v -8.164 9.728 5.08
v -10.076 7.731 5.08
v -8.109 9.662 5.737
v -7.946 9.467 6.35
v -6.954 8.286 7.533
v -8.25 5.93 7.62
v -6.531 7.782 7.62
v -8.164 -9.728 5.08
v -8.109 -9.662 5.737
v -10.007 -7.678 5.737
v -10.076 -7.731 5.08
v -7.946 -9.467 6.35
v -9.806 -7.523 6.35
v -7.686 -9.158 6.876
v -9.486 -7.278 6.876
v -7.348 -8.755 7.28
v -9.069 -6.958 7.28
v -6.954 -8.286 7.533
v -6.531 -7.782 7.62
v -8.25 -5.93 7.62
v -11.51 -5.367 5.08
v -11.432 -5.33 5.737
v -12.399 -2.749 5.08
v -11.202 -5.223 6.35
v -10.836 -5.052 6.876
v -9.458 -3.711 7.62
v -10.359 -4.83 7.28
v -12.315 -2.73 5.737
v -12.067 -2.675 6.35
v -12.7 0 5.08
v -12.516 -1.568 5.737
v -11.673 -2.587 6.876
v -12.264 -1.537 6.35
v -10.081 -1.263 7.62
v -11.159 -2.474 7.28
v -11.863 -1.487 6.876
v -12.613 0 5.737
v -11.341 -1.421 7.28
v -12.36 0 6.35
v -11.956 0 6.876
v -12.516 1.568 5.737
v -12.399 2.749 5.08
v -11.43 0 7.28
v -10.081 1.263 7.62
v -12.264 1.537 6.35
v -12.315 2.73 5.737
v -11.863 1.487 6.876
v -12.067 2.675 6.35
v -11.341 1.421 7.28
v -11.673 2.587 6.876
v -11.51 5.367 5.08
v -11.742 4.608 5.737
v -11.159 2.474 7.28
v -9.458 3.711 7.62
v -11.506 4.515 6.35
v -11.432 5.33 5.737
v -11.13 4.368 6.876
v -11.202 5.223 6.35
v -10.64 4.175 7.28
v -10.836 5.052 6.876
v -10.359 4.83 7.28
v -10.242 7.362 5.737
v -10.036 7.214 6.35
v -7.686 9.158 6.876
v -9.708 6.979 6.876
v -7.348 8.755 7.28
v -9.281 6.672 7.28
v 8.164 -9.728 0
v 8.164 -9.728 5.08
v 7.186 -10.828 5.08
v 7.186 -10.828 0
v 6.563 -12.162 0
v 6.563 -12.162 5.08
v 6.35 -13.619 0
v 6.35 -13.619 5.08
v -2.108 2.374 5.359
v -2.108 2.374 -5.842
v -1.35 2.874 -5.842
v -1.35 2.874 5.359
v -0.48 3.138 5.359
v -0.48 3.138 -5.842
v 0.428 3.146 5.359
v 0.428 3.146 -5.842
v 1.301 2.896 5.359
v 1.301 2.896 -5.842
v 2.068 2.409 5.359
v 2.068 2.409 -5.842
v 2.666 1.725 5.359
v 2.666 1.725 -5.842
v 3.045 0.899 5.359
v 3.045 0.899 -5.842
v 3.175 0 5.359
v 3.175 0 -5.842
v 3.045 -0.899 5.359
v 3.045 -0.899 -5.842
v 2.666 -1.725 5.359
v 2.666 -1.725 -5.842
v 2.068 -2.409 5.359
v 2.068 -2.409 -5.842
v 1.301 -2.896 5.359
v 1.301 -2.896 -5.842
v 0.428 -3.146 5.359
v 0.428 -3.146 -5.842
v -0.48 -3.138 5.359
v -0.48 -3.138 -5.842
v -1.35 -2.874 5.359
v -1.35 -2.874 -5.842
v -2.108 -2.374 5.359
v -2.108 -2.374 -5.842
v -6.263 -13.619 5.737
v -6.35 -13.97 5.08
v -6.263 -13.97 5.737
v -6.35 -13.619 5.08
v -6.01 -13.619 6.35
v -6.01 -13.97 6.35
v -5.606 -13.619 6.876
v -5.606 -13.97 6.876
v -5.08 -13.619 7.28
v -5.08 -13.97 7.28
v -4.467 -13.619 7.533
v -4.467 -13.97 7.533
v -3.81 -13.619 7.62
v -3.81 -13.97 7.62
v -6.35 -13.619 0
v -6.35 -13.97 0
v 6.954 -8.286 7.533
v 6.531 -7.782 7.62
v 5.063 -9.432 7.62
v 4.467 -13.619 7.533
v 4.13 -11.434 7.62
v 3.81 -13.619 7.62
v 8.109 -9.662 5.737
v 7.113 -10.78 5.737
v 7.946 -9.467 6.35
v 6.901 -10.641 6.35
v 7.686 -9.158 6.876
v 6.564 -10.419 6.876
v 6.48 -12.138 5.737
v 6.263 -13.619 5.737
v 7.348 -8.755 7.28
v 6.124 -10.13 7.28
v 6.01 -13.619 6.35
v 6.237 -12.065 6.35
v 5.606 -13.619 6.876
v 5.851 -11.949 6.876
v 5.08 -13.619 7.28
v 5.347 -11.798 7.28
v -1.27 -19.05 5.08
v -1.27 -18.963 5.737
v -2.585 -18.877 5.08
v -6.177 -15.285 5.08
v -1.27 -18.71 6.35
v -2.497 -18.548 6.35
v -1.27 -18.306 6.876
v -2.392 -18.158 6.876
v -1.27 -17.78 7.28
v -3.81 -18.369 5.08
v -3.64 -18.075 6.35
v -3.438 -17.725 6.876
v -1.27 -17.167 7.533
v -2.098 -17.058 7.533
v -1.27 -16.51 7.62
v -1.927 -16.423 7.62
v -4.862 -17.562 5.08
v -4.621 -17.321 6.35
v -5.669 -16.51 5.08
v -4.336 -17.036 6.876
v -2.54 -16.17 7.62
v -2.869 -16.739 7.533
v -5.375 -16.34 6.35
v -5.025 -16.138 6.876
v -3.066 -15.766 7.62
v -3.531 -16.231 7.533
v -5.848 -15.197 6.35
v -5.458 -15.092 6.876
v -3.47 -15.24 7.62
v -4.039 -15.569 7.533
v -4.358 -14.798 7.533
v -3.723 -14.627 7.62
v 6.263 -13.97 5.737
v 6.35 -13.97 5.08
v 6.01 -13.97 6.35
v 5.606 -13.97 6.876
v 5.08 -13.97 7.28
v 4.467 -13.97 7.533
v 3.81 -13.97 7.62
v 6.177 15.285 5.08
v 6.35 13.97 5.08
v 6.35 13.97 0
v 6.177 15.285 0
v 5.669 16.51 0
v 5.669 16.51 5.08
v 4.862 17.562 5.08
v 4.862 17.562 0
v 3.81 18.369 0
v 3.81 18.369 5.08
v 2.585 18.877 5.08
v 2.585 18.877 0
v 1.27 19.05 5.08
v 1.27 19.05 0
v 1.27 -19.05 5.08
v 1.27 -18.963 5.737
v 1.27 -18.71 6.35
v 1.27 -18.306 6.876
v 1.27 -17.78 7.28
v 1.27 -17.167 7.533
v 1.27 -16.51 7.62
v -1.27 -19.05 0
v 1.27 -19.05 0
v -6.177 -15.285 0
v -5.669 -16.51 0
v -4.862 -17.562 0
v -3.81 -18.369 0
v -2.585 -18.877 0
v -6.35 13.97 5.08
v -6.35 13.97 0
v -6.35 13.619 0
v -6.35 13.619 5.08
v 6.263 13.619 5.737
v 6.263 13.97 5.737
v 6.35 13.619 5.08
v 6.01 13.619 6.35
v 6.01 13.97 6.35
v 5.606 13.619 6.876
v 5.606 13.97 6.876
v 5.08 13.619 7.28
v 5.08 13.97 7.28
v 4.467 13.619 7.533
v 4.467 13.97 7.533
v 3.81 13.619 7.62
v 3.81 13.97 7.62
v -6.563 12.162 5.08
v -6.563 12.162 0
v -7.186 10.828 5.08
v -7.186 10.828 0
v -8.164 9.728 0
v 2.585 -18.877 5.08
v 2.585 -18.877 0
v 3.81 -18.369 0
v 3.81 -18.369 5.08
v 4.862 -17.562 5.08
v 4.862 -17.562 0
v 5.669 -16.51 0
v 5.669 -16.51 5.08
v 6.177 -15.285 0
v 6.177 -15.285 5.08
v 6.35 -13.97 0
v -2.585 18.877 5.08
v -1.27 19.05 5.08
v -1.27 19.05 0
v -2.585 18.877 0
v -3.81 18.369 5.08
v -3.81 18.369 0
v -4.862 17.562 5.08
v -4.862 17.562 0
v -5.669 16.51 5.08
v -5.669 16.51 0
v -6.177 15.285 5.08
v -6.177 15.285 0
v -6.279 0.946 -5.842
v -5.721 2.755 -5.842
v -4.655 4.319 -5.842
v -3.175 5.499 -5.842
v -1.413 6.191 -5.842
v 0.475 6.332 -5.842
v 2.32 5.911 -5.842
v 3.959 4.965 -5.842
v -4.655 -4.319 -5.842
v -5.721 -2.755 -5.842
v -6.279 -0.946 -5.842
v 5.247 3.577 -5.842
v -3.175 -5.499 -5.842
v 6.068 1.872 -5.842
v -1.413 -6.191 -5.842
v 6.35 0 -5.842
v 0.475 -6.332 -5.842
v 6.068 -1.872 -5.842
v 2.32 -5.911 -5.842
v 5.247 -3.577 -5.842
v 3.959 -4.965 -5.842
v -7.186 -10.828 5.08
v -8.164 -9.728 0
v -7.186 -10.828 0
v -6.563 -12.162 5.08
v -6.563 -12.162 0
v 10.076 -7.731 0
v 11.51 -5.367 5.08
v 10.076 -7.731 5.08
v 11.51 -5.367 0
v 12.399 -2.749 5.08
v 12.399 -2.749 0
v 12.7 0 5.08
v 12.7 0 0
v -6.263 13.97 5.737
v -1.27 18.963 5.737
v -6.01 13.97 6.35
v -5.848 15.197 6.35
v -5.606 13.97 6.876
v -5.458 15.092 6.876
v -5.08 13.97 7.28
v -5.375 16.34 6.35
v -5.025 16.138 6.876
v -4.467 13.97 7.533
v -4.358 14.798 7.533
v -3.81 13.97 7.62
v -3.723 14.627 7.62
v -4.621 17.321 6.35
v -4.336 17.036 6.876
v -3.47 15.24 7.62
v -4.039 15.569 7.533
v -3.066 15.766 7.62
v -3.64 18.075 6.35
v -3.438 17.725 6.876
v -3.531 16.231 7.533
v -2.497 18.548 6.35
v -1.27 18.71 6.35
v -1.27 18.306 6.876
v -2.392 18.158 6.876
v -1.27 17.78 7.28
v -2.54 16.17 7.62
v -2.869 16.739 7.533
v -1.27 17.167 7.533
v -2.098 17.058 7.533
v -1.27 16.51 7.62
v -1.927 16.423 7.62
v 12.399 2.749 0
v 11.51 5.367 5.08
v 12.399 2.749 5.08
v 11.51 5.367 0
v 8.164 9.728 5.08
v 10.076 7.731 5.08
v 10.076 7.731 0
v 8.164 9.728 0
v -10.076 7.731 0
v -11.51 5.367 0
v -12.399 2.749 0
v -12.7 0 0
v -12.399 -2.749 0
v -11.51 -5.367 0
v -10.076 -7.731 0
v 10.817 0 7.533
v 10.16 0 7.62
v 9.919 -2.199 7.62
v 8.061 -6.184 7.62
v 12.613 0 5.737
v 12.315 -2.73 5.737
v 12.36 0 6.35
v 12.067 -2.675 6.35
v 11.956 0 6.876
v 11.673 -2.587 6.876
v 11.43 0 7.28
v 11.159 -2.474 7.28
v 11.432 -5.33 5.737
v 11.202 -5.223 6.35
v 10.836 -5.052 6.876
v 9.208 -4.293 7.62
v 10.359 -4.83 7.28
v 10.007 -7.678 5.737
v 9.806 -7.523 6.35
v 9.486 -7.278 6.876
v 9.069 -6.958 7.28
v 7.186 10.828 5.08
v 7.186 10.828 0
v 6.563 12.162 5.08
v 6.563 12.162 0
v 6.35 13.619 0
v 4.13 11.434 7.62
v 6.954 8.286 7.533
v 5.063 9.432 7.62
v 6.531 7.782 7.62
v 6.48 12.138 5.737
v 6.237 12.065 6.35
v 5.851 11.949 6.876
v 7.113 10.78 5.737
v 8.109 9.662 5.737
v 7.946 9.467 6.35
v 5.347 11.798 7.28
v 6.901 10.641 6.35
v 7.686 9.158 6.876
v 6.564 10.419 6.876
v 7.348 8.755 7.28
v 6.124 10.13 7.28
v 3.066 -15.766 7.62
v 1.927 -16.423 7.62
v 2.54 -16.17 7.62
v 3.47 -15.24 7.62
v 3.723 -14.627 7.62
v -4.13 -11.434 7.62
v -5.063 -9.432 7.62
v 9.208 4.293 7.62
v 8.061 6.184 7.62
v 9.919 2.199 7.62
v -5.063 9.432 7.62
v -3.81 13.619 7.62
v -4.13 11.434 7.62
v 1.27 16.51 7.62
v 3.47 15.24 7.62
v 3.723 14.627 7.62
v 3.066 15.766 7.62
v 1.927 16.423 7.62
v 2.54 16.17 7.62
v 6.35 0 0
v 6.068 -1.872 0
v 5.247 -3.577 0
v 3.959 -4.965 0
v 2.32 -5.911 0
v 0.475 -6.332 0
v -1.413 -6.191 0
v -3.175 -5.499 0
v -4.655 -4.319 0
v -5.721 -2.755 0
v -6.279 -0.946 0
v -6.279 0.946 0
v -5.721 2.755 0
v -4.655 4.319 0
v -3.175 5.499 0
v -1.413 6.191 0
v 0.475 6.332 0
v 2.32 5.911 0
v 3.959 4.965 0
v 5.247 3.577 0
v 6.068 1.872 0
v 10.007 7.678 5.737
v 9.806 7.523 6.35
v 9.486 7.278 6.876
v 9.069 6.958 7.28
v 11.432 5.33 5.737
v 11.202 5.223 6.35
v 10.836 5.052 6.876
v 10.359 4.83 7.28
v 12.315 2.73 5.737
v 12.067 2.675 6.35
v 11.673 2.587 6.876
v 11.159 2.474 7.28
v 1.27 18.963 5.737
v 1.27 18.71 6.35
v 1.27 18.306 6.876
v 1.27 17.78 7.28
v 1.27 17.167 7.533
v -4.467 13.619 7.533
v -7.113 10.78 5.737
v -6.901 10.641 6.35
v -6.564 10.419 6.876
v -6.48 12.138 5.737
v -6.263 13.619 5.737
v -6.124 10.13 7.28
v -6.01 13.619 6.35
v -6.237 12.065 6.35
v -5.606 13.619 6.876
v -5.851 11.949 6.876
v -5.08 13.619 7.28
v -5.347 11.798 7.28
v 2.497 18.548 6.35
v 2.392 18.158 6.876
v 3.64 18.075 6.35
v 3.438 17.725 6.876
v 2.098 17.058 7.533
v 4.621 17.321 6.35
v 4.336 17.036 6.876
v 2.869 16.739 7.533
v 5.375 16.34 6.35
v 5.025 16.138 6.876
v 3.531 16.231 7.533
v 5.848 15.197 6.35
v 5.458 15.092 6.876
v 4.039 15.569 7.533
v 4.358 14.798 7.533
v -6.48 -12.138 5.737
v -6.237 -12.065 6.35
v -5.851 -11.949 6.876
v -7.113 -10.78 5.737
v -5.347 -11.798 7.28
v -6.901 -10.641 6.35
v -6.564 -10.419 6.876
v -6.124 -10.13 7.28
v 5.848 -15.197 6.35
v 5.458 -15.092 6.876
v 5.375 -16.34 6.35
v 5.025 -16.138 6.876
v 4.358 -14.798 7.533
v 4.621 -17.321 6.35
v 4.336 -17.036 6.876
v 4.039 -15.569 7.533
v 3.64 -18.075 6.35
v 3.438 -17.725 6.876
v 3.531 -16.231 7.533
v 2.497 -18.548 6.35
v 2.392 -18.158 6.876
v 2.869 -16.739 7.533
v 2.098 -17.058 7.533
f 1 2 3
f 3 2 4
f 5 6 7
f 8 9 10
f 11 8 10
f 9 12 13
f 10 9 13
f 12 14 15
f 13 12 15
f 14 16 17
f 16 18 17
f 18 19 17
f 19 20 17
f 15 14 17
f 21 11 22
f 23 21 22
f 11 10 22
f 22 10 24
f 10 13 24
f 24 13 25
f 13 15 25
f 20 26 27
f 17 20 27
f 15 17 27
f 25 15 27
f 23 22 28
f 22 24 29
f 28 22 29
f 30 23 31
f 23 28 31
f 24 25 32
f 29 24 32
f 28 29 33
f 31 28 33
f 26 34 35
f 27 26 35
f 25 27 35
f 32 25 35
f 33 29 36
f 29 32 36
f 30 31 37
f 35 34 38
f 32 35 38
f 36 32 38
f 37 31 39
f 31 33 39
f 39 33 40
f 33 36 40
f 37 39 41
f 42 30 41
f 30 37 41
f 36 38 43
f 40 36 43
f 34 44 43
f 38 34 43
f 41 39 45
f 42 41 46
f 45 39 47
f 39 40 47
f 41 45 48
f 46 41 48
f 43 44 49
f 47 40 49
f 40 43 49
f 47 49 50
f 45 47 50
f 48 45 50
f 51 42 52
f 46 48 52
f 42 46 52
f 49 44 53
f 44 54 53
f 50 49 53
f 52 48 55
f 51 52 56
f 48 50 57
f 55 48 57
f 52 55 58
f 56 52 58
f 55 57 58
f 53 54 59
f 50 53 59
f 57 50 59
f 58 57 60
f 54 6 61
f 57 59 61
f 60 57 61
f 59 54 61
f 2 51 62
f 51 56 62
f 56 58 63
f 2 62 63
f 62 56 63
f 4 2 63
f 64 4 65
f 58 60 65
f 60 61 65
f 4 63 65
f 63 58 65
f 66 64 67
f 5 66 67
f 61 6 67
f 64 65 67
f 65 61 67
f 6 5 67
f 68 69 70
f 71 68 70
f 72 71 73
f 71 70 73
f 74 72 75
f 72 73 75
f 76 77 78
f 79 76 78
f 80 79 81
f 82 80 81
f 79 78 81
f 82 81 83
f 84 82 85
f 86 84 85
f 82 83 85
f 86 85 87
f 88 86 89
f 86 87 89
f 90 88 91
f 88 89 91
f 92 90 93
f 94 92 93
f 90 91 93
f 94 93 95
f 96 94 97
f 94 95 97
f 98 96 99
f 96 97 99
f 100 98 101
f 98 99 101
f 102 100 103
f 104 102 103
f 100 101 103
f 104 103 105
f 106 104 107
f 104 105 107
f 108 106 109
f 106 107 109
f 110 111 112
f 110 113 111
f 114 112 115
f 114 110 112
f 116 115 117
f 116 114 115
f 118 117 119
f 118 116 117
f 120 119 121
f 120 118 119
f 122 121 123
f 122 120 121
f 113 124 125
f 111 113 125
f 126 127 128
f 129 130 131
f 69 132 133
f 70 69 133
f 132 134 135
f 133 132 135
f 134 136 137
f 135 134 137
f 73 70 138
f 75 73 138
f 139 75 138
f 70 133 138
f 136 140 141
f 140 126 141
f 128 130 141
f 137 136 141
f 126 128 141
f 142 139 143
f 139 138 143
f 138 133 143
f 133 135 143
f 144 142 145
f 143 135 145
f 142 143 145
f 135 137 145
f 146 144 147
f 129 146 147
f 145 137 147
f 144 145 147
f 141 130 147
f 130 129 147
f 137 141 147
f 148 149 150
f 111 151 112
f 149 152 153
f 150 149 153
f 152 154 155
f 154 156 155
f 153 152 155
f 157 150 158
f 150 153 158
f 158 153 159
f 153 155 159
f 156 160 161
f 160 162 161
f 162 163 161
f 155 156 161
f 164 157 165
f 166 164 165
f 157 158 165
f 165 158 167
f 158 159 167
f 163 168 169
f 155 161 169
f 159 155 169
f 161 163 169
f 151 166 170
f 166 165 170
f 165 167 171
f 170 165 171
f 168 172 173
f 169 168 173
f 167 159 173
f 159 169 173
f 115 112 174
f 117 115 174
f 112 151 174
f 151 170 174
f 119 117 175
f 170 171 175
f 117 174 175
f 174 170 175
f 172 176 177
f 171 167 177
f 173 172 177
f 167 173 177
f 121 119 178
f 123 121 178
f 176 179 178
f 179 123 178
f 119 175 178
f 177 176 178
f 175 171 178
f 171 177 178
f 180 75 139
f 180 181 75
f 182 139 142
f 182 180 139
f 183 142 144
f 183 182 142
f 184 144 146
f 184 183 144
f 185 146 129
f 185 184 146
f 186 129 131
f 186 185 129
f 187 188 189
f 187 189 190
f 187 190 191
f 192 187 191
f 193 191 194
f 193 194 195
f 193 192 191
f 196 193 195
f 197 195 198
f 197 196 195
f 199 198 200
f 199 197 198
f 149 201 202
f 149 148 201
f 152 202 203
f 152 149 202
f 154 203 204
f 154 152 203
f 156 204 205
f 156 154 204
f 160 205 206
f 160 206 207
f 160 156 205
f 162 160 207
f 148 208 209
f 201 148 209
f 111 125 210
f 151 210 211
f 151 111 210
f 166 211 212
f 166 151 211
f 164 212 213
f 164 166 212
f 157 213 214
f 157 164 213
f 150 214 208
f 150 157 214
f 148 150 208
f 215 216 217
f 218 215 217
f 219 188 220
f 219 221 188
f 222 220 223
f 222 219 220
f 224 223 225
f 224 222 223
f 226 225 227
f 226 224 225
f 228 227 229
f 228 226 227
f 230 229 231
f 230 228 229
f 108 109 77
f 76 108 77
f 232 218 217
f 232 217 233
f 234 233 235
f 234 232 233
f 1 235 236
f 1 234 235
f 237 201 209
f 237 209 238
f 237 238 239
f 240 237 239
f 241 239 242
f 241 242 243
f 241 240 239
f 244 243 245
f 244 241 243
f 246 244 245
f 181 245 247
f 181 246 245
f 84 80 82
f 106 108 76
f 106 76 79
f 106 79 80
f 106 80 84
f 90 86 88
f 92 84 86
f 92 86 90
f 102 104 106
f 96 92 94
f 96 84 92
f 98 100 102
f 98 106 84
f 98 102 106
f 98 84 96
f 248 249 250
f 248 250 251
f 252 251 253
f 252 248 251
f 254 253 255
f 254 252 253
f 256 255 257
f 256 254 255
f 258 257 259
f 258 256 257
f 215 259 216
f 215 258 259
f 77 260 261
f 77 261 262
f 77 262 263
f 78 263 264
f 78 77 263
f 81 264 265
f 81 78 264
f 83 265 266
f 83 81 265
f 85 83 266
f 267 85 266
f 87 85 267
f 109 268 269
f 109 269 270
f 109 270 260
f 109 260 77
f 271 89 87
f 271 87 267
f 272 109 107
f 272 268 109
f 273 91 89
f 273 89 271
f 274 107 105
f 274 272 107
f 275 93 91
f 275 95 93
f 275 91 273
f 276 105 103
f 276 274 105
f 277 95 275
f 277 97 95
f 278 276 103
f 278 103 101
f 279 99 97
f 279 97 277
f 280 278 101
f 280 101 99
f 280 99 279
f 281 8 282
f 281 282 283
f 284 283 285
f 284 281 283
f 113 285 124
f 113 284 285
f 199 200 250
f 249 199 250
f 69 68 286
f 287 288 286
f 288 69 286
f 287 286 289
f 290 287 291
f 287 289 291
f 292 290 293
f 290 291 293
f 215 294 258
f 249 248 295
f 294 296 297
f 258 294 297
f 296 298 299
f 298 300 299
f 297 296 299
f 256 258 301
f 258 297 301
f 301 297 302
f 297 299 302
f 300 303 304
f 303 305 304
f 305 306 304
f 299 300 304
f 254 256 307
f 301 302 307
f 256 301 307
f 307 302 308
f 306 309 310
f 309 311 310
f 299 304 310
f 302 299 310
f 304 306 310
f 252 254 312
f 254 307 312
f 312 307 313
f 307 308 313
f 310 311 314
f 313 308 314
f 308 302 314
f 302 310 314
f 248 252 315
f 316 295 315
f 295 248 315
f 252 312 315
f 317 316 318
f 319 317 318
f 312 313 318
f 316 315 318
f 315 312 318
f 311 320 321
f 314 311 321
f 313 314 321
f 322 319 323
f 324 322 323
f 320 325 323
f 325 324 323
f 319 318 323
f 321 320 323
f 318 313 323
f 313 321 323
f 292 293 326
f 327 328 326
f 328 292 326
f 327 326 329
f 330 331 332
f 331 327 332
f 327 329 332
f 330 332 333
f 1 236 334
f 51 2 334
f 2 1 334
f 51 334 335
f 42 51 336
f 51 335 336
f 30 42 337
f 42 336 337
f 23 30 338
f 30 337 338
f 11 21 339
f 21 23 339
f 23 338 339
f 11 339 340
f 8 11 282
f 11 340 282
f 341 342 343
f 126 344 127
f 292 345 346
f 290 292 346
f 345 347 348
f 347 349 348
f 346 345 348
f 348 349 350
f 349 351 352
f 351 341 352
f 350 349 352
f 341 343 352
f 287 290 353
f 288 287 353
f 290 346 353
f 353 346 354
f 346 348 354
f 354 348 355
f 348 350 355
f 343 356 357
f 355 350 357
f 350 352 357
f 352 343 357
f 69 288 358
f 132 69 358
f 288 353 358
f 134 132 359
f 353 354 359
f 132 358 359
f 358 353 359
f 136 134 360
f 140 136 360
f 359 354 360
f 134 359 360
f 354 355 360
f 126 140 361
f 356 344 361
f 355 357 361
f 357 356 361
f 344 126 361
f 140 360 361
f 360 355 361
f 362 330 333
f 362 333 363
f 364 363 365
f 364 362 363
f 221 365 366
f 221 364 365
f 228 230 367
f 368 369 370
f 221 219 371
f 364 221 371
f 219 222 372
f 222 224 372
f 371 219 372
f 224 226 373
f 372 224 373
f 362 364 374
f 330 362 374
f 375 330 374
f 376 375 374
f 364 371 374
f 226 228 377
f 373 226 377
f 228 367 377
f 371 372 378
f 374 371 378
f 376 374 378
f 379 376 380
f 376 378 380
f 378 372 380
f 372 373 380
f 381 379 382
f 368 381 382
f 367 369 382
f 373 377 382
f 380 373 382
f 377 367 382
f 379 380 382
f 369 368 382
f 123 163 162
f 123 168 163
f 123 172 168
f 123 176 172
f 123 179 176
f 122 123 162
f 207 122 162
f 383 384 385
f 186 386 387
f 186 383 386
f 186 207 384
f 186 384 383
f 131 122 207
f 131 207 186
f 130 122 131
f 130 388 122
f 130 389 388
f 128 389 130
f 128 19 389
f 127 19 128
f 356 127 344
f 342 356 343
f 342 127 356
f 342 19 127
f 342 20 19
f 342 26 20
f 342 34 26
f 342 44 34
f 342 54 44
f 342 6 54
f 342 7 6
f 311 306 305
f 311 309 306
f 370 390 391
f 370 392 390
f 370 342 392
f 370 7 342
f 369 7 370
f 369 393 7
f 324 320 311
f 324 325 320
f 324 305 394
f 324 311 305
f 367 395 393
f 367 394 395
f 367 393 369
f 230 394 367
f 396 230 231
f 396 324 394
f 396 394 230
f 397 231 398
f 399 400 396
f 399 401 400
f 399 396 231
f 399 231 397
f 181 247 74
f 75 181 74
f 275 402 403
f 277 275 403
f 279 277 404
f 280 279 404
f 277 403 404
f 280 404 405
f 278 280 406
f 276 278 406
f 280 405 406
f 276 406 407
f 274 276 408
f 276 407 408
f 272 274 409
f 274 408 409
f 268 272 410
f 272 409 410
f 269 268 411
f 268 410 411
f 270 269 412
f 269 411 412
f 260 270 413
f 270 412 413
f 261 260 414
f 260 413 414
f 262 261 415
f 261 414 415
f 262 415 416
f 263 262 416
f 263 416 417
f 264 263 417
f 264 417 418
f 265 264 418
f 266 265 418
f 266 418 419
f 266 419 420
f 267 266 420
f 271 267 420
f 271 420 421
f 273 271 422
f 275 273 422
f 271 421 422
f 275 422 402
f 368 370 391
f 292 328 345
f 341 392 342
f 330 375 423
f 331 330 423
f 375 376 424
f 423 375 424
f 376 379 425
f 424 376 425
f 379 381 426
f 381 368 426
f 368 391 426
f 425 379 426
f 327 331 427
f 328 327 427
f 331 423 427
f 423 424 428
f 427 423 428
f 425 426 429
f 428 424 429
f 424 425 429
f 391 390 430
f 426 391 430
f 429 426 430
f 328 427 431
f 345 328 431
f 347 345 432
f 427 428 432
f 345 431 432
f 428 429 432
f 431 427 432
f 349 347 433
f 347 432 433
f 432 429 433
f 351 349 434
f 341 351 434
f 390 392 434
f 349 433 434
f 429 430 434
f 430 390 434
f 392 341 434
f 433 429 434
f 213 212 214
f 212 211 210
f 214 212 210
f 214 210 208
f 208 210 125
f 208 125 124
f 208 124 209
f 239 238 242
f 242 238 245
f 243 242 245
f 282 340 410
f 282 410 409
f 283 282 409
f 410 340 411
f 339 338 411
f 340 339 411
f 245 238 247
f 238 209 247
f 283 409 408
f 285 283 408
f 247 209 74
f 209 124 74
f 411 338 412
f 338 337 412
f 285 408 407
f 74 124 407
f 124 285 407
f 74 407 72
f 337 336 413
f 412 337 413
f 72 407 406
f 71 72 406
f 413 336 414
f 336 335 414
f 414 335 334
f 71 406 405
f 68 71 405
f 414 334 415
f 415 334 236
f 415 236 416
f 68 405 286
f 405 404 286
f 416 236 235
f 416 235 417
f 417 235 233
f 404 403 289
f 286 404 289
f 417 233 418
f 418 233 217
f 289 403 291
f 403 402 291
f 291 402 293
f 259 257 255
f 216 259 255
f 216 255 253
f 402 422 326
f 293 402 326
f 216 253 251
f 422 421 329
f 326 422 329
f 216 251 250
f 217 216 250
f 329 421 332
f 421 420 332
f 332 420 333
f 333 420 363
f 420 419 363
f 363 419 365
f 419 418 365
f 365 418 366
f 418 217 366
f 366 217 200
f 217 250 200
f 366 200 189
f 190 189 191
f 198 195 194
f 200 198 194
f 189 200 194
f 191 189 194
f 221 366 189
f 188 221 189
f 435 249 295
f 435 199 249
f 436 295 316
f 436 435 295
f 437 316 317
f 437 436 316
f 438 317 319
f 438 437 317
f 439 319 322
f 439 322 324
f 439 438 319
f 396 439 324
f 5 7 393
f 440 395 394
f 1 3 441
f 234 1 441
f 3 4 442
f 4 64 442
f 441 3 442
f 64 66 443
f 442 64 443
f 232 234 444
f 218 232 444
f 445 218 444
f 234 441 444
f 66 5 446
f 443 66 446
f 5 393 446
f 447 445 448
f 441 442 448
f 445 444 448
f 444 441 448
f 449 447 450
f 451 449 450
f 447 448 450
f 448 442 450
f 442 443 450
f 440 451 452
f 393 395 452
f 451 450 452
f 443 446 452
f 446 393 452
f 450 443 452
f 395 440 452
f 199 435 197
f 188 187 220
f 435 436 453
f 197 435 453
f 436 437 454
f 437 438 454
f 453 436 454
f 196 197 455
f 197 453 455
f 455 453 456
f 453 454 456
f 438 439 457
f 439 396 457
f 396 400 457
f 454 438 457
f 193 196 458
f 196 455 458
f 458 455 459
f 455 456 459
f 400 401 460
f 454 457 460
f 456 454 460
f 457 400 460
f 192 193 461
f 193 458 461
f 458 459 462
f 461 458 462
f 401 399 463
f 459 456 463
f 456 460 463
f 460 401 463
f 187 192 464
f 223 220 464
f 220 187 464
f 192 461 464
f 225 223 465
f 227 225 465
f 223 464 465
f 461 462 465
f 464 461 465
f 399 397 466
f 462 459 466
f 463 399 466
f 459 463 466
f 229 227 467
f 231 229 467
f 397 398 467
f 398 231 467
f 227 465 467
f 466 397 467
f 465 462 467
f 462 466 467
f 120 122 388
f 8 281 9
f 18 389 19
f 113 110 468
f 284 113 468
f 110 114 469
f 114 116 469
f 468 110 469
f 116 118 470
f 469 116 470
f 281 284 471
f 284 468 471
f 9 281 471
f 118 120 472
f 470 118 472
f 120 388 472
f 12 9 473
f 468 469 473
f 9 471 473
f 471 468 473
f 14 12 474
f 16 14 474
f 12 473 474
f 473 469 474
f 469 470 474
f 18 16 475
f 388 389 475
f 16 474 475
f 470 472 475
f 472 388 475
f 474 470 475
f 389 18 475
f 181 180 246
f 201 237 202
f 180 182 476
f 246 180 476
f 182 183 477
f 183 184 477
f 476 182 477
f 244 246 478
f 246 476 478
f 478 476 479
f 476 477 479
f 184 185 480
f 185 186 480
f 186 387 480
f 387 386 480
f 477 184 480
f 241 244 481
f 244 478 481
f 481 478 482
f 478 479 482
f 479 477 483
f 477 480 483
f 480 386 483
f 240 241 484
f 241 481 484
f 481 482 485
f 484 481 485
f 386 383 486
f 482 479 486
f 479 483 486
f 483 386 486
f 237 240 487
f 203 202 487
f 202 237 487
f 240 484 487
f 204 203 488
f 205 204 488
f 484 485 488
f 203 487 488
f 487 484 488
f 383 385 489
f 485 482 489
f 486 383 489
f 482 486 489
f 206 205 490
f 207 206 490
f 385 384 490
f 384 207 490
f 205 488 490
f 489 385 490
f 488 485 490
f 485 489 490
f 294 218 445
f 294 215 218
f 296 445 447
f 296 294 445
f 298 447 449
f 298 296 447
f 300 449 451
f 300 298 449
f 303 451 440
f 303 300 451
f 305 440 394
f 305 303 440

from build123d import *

# Parameters (mm, degrees)
F1_DEPTH = 7.62
F2_R     = 5.08
F3_R     = 2.54
F4_R     = 6.35
F5_DEPTH = 5.842
F7_DEPTH = 11.2014


with BuildPart() as f1:
    # F0 (on Top) → F1 (new body)
    with BuildSketch(Plane.XY):
        with BuildLine():
            ThreePointArc((6.35, -10.9985226281), (10.9985226281, -6.35), (12.7, 0))
            ThreePointArc((12.7, 0), (10.9985226281, 6.35), (6.35, 10.9985226281))
            Line((6.35, 10.9985226281), (6.35, -10.9985226281))
        make_face()
        with BuildLine():
            Line((6.35, -10.9985226281), (6.35, 10.9985226281))
            ThreePointArc((6.35, 10.9985226281), (0, 12.7), (-6.35, 10.9985226281))
            Line((-6.35, 10.9985226281), (-6.35, -10.9985226281))
            ThreePointArc((-6.35, -10.9985226281), (0, -12.7), (6.35, -10.9985226281))
        make_face()
        with BuildLine():
            ThreePointArc((-6.35, 10.9985226281), (0, 12.7), (6.35, 10.9985226281))
            Line((6.35, 10.9985226281), (6.35, 19.05))
            Line((6.35, 19.05), (-6.35, 19.05))
            Line((-6.35, 19.05), (-6.35, 10.9985226281))
        make_face()
        with BuildLine():
            Line((6.35, -19.05), (6.35, -10.9985226281))
            ThreePointArc((6.35, -10.9985226281), (0, -12.7), (-6.35, -10.9985226281))
            Line((-6.35, -10.9985226281), (-6.35, -19.05))
            Line((-6.35, -19.05), (6.35, -19.05))
        make_face()
        with BuildLine():
            Line((-6.35, -10.9985226281), (-6.35, 10.9985226281))
            ThreePointArc((-6.35, 10.9985226281), (-12.7, 0), (-6.35, -10.9985226281))
        make_face()
    extrude(amount=F1_DEPTH)

    # F2
    f2_edges = [f1.edges().sort_by_distance(p)[0] for p in [
        (6.35, -10.998523, 3.81),
        (6.35, -19.05, 3.81),
        (-6.35, -19.05, 3.81),
        (-6.35, -10.998523, 3.81),
        (-6.35, 10.998523, 3.81),
        (-6.35, 19.05, 3.81),
        (6.35, 19.05, 3.81),
        (6.35, 10.998523, 3.81),
    ]]
    fillet(f2_edges, radius=F2_R)

    # F3
    f3_edges = [f1.edges().sort_by_distance(p)[0] for p in [
        (12.7, 0, 7.62),
        (6.825859, -11.472541, 7.62),
        (6.825859, 11.472541, 7.62),
        (6.35, -13.794616, 7.62),
        (6.35, 13.794616, 7.62),
        (4.862102, -17.562102, 7.62),
        (4.862102, 17.562102, 7.62),
        (0, -19.05, 7.62),
        (0, 19.05, 7.62),
        (-4.862102, -17.562102, 7.62),
        (-4.862102, 17.562102, 7.62),
        (-6.35, -13.794616, 7.62),
        (-6.35, 13.794616, 7.62),
        (-6.825859, -11.472541, 7.62),
        (-6.825859, 11.472541, 7.62),
        (-12.7, 0, 7.62),
    ]]
    fillet(f3_edges, radius=F3_R)

    # F4 (on face) → F5 (join)
    with BuildSketch(Plane(origin=(0, 0, 0), x_dir=(1, 0, 0), z_dir=(0, 0, -1))):
        Circle(F4_R)
    extrude(amount=F5_DEPTH)

    # F6 (on face) → F7 (cut)
    with BuildSketch(Plane(origin=(0, 0, -5.842), x_dir=(1, 0, 0), z_dir=(0, 0, -1))):
        with BuildLine():
            Line((-2.1082, 2.3740509177), (-2.1082, -2.3740509177))
            ThreePointArc((-2.1082, -2.3740509177), (3.175, 0), (-2.1082, 2.3740509177))
        make_face()
    extrude(amount=-F7_DEPTH, mode=Mode.SUBTRACT)


solid = f1.part
